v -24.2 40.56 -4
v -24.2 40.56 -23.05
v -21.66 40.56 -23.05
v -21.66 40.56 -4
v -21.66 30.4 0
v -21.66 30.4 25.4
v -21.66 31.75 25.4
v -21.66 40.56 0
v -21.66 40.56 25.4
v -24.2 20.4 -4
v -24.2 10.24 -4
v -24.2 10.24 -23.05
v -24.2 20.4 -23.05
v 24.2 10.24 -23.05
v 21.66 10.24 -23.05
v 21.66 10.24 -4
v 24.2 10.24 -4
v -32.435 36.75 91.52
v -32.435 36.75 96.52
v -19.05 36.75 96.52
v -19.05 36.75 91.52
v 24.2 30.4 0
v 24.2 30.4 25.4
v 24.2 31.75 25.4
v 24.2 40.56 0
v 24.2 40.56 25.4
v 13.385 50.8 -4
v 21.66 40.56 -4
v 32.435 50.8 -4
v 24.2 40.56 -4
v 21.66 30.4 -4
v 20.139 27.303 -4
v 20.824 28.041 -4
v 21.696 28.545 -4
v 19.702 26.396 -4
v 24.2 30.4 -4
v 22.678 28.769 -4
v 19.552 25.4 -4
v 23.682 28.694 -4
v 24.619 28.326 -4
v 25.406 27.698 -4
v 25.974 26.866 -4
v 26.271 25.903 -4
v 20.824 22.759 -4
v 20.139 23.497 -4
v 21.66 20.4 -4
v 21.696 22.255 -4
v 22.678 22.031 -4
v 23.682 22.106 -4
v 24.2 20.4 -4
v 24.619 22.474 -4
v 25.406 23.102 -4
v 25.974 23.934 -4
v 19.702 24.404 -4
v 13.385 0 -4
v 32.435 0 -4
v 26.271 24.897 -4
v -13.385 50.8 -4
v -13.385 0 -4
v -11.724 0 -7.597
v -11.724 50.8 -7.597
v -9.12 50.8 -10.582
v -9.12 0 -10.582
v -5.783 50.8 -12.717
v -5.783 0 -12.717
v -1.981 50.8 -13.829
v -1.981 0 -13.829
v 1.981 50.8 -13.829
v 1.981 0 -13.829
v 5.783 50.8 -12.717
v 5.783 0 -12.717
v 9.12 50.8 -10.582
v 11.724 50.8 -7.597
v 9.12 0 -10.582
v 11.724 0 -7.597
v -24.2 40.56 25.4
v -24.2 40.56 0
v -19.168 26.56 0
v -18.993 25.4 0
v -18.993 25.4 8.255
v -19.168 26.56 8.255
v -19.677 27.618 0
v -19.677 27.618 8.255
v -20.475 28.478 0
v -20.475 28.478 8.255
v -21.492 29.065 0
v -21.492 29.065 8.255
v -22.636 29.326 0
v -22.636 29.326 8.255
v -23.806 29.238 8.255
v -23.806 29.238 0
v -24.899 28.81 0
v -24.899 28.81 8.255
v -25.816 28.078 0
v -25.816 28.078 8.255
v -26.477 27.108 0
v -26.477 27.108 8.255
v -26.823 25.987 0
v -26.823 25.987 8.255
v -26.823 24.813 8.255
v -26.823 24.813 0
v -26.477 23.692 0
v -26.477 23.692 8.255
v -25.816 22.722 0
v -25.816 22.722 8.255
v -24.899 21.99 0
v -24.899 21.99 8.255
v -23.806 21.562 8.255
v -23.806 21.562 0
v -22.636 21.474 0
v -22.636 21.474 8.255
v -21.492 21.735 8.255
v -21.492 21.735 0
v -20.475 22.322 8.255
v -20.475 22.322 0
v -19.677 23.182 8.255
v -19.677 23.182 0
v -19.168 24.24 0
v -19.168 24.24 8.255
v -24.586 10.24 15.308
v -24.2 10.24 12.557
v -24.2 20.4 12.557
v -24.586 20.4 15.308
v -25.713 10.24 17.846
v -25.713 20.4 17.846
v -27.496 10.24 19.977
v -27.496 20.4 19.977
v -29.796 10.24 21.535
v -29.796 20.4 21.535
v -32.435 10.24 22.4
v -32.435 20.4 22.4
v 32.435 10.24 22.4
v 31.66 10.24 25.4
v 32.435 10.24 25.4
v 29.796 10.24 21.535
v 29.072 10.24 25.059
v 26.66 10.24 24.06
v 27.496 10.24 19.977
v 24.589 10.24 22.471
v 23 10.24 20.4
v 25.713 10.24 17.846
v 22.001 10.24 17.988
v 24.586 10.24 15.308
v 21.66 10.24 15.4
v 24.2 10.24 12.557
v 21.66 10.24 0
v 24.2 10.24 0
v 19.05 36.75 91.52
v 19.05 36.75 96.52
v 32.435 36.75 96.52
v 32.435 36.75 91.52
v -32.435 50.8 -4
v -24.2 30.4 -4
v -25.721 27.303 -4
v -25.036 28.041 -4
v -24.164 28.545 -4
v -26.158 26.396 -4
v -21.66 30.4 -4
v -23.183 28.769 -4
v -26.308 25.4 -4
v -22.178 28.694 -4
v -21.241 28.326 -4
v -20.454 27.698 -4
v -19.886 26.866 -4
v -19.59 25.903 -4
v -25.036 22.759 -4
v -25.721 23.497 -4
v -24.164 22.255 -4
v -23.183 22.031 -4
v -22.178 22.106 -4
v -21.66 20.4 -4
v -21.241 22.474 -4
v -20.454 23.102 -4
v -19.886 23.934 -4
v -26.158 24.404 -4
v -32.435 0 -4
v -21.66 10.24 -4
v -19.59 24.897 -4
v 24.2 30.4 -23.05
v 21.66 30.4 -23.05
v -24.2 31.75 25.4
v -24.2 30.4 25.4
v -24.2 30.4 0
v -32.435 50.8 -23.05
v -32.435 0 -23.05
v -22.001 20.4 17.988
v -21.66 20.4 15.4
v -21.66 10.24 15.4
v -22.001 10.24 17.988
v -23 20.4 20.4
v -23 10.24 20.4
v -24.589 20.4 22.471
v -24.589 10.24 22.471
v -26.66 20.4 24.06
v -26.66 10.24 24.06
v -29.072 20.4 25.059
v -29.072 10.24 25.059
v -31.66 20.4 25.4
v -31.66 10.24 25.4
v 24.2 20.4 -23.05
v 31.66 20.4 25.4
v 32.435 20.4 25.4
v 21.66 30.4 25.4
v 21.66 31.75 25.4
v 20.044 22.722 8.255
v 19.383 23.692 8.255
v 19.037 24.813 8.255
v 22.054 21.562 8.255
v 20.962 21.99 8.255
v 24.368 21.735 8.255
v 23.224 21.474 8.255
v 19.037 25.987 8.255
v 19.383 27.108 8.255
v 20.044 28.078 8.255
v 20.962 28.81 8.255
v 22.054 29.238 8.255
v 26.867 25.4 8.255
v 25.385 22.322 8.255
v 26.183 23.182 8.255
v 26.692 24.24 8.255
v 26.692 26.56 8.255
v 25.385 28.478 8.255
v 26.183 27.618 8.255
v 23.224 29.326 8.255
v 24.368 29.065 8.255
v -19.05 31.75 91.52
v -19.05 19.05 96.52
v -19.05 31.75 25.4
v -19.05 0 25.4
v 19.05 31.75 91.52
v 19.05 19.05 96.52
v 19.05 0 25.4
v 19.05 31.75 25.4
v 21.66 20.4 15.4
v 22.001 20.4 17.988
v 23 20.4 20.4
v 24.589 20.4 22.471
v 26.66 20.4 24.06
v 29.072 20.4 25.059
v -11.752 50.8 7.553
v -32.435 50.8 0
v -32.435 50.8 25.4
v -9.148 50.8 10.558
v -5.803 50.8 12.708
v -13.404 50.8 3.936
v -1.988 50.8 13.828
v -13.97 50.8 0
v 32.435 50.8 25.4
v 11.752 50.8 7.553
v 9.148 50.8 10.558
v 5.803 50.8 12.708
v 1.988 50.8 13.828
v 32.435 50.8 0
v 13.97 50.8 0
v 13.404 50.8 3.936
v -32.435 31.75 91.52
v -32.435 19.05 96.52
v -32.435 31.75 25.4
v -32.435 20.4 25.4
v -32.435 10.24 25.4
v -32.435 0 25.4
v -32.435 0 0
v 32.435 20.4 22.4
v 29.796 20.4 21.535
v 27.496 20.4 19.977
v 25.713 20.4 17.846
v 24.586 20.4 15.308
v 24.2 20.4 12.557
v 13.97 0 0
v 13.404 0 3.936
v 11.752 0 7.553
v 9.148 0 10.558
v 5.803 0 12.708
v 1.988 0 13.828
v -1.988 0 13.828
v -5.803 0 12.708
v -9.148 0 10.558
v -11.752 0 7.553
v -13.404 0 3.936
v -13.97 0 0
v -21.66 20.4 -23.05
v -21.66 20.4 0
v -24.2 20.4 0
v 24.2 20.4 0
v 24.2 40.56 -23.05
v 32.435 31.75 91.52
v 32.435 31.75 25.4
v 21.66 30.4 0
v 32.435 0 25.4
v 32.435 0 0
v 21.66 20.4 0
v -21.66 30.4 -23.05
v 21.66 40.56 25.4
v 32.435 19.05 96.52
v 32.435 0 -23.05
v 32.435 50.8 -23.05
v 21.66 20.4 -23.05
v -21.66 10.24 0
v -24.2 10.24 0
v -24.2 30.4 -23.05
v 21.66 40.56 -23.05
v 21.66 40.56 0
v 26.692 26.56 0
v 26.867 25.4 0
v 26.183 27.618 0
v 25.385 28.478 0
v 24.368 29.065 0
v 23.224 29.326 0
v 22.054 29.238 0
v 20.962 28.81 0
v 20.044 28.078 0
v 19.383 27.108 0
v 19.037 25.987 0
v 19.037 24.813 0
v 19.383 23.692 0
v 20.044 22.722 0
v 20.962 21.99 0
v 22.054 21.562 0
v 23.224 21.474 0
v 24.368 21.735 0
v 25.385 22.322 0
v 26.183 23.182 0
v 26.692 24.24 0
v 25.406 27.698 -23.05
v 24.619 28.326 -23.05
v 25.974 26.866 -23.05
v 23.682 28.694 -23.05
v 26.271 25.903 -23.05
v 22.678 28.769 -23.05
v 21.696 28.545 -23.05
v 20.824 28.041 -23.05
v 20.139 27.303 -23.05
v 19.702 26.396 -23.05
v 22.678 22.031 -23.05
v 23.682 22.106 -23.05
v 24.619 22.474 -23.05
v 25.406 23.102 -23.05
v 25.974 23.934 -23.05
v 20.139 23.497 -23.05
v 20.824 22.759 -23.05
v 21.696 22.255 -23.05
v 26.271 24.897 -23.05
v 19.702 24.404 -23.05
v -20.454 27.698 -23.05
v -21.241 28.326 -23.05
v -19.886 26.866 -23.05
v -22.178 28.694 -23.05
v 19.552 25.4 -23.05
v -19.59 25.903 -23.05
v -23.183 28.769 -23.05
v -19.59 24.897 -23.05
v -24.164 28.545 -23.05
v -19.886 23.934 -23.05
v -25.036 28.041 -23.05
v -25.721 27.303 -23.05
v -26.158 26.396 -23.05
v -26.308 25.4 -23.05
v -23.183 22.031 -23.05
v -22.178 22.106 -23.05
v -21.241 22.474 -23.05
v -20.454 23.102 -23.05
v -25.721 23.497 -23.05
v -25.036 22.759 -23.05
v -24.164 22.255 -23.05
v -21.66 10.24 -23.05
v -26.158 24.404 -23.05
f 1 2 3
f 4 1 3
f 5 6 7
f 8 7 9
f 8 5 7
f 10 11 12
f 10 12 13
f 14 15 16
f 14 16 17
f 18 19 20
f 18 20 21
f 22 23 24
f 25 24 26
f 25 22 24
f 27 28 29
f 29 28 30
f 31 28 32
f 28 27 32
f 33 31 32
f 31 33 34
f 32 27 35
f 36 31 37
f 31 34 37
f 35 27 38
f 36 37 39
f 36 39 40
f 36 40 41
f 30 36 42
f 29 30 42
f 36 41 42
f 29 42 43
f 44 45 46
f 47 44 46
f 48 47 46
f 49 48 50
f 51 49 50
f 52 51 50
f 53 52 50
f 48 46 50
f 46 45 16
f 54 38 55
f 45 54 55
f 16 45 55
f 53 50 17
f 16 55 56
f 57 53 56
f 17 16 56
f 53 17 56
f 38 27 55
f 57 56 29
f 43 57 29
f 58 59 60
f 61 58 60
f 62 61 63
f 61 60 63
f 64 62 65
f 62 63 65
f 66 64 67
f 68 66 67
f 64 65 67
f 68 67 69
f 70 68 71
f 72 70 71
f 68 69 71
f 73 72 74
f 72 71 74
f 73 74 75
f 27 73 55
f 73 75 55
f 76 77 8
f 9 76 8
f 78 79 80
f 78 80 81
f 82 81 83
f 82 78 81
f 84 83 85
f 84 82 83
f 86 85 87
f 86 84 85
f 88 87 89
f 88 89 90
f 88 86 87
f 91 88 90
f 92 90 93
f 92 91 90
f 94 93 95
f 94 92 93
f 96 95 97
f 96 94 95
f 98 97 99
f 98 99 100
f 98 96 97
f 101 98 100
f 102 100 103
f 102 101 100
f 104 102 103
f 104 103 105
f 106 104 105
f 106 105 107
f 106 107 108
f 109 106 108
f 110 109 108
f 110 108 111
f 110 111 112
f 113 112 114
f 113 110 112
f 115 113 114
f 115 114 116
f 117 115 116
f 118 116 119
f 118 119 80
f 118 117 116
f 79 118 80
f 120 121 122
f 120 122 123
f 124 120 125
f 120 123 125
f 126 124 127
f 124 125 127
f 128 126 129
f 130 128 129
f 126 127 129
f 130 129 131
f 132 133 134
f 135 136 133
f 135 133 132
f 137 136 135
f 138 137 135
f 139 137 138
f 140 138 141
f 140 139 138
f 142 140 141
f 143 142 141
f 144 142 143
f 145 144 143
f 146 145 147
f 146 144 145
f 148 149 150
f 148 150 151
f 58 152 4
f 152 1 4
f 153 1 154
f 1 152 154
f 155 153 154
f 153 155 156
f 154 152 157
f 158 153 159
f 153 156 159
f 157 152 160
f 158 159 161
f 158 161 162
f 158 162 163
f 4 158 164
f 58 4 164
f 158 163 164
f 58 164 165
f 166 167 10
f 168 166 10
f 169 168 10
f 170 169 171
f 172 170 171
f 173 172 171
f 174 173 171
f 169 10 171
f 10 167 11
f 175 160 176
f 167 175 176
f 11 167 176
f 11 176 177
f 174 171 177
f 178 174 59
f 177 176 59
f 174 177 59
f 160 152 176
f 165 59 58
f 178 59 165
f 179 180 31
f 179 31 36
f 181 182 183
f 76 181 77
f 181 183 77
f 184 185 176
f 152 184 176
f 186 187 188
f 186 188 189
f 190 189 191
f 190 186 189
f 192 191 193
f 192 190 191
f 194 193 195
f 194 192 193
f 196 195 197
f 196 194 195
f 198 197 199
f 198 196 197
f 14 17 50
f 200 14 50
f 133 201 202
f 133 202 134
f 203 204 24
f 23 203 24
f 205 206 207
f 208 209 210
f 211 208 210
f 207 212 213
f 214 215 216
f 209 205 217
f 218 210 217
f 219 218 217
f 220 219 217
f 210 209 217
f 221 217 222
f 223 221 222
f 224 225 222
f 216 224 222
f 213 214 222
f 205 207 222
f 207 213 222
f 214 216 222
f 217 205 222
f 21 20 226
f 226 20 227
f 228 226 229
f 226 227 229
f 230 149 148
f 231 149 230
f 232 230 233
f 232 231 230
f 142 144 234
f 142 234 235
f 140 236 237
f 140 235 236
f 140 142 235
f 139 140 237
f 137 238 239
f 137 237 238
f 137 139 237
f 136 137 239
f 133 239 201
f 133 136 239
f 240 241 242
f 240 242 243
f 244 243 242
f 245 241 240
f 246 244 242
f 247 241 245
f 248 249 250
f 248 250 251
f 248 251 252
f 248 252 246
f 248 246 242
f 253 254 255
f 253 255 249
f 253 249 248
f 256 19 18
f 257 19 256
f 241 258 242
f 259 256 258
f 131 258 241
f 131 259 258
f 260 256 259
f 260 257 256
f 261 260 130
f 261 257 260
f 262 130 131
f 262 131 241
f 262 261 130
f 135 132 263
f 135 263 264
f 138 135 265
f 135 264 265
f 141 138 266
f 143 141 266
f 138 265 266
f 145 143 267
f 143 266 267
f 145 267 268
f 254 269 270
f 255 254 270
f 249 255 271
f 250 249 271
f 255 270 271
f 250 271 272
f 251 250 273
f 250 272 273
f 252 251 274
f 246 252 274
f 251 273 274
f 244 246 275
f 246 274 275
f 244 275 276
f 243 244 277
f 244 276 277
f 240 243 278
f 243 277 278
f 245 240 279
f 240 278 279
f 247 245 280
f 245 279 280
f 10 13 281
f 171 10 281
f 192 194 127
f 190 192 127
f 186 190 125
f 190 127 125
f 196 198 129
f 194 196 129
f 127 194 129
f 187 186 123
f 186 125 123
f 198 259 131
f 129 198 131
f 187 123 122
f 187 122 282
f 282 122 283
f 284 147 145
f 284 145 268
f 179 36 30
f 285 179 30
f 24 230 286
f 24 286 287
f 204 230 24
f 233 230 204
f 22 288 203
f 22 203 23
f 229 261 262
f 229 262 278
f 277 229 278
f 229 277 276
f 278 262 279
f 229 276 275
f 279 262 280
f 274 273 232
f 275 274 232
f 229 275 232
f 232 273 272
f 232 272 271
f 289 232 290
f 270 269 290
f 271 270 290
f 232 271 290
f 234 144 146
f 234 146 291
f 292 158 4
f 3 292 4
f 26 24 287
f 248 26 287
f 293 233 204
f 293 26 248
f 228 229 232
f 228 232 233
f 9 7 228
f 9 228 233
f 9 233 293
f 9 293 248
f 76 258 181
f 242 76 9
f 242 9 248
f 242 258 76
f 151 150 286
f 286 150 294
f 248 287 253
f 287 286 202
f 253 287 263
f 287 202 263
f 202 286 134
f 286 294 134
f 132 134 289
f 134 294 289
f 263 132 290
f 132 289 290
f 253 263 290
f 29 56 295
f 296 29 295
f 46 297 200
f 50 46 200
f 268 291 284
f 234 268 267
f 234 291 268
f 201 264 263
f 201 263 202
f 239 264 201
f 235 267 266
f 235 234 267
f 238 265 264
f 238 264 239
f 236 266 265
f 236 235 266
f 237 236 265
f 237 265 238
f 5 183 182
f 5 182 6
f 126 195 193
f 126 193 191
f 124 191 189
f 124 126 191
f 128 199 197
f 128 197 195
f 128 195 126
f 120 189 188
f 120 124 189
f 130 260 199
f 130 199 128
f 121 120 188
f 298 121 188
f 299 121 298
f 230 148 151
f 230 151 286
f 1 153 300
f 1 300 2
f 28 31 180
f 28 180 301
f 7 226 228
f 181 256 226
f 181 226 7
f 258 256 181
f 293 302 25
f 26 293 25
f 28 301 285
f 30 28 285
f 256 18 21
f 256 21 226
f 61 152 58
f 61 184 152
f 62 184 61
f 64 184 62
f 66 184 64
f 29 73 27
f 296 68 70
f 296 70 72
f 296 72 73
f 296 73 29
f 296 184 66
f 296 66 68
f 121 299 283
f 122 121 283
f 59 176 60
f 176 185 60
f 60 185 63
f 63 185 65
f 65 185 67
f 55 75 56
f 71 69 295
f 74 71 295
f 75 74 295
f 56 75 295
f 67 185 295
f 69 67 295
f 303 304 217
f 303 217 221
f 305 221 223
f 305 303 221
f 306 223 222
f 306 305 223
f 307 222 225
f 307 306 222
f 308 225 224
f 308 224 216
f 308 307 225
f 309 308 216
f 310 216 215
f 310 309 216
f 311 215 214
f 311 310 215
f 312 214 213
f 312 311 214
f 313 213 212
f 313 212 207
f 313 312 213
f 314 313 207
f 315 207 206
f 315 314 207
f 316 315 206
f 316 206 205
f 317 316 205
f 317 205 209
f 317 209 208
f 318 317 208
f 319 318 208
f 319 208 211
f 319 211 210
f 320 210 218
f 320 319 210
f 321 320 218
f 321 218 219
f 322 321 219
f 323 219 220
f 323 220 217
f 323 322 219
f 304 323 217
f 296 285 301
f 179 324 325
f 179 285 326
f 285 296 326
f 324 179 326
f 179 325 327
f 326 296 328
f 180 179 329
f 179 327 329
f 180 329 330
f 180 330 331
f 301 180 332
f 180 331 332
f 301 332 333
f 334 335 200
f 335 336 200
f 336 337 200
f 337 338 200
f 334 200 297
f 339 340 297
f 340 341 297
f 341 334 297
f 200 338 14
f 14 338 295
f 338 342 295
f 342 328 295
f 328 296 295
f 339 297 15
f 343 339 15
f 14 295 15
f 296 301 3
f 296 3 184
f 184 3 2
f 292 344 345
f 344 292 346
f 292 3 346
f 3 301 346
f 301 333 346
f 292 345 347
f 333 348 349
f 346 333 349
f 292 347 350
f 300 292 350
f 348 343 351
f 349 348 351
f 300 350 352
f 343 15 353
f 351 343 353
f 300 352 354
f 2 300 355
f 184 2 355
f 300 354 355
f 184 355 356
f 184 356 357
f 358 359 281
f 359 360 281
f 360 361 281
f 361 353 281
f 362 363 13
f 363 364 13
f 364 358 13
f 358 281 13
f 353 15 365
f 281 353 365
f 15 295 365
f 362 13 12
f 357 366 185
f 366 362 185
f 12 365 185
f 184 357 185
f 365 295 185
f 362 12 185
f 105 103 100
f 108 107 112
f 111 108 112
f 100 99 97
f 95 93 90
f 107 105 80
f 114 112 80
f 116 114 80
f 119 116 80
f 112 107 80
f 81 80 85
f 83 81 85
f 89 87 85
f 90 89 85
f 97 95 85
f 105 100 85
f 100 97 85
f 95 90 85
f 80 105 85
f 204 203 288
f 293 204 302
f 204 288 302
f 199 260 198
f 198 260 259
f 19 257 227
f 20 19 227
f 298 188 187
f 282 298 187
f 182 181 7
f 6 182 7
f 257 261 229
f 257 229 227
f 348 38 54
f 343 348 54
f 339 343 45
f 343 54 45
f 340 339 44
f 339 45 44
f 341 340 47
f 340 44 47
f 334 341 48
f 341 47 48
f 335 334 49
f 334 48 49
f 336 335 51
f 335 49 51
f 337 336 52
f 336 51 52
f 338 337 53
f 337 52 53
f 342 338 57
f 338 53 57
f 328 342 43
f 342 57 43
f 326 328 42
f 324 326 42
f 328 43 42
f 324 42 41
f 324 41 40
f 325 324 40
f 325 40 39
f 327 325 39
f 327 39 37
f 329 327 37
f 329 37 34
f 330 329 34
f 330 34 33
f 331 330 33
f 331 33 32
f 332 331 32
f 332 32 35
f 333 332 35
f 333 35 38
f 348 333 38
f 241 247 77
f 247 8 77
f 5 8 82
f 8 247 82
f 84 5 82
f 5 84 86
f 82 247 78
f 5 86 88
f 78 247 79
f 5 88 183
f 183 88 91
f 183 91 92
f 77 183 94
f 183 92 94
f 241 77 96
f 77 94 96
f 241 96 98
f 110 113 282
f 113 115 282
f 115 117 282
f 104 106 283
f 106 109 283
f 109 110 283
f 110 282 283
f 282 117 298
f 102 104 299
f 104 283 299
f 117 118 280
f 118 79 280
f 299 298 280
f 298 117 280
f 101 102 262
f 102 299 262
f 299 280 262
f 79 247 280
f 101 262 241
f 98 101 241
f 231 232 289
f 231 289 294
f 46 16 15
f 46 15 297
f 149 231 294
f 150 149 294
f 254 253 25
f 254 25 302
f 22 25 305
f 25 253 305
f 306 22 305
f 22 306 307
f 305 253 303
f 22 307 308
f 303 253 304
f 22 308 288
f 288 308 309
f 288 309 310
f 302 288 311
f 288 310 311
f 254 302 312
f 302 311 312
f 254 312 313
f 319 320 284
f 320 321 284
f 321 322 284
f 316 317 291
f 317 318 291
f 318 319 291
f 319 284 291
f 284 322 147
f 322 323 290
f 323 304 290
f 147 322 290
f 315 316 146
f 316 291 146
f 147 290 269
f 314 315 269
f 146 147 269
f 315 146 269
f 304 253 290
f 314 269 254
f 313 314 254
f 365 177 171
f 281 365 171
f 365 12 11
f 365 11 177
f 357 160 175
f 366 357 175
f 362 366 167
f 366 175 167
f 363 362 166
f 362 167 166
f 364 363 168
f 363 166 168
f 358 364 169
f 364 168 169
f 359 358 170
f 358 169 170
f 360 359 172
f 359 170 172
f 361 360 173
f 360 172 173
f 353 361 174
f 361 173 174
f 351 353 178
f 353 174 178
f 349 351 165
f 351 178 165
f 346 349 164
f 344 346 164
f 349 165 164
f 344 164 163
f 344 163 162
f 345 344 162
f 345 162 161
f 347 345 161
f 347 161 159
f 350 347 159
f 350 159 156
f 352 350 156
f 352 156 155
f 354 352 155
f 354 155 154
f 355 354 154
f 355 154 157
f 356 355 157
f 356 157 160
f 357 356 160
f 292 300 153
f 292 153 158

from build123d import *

# Parameters (mm, degrees)
BOSS_EXTRUDE1_DEPTH = 50.8
BOSS_EXTRUDE3_DEPTH = 50.8
SKETCH1_4_W         = 13.385099925
SKETCH1_4_H         = 71.12
BOSS_EXTRUDE2_DEPTH = 50.8
CUT_EXTRUDE1_START  = -32.435099925
CUT_EXTRUDE1_DEPTH  = 64.87019985
SKETCH3_R           = 3.937
SKETCH3_R_2         = 3.3782
CUT_EXTRUDE2_DEPTH  = 8.255
SKETCH3_2_W         = 2.54
SKETCH3_2_H         = 10.16
CUT_EXTRUDE3_DEPTH  = 25.4
CUT_EXTRUDE6_START  = -32.4351
SKETCH2_6_W         = 3
SKETCH2_6_H         = 10.16
CUT_EXTRUDE6_DEPTH  = 8.235
CUT_EXTRUDE7_START  = 21.6601
CUT_EXTRUDE7_DEPTH  = 10.775
FILLET2_R           = 10
SKETCH3_5_R         = 3.3782
SKETCH3_5_W         = 2.54
SKETCH3_5_H         = 10.16
CUT_EXTRUDE8_DEPTH  = 28.255


with BuildPart() as part:
    # Sketch1 → Boss-Extrude1 (new body)
    with BuildSketch(Plane(origin=(0, 0, 0), x_dir=(1, 0, 0), z_dir=(0, 1, 0))):
        with BuildLine():
            ThreePointArc((13.97, 0), (0, -13.97), (-13.97, 0))
            Line((-13.97, 0), (-32.435099925, 0))
            Line((-32.435099925, 0), (-32.435099925, -25.4))
            Line((-32.435099925, -25.4), (-19.05, -25.4))
            Line((-19.05, -25.4), (19.05, -25.4))
            Line((19.05, -25.4), (32.435099925, -25.4))
            Line((32.435099925, -25.4), (32.435099925, 0))
            Line((32.435099925, 0), (13.97, 0))
        make_face()
    extrude(amount=BOSS_EXTRUDE1_DEPTH)

    # Sketch1<4> → Boss-Extrude2 (add)
    with BuildSketch(Plane(origin=(0, 0, 0), x_dir=(1, 0, 0), z_dir=(0, 1, 0))):
        with Locations((-25.742549963, -60.96)):
            Rectangle(SKETCH1_4_W, SKETCH1_4_H)
        with Locations((25.742549963, -60.96)):
            Rectangle(SKETCH1_4_W, SKETCH1_4_H)
    extrude(amount=BOSS_EXTRUDE2_DEPTH)

    # Cut-Extrude1: read off the stored shape, not the designer's step
    # Cut-Extrude1 outline → Cut-Extrude1 (cut)
    with BuildSketch(Plane(origin=(0, 0, 0), x_dir=(0, 0, -1), z_dir=(1, 0, 0)).offset(CUT_EXTRUDE1_START)):
        Polygon((-96.52, 0), (-25.4, 0), (-96.52, 19.05), align=None)
        Polygon((-91.52, 31.75), (-25.4, 31.75), (-25.4, 50.8), (-96.52, 50.8), (-96.52, 36.75), (-91.52, 36.75), align=None)
    extrude(amount=CUT_EXTRUDE1_DEPTH, mode=Mode.SUBTRACT)

    # Sketch3 → Cut-Extrude2 (cut)
    # profile 1 of 4: a face of its own
    with BuildSketch(Plane.XY):
        with Locations((-22.930099925, 25.4)):
            Circle(SKETCH3_R)
        with Locations((-22.930099925, 25.4)):
            Circle(SKETCH3_R_2, mode=Mode.SUBTRACT)
    # profile 2 of 4: a face of its own
    with BuildSketch(Plane.XY):
        with Locations((-22.930099925, 25.4)):
            Circle(SKETCH3_R_2)
    # profile 3 of 4: a face of its own
    with BuildSketch(Plane.XY):
        with Locations((22.930099925, 25.4)):
            Circle(SKETCH3_R)
        with Locations((22.930099925, 25.4)):
            Circle(SKETCH3_R_2, mode=Mode.SUBTRACT)
    # profile 4 of 4: a face of its own
    with BuildSketch(Plane.XY):
        with Locations((22.930099925, 25.4)):
            Circle(SKETCH3_R_2)
    extrude(amount=CUT_EXTRUDE2_DEPTH, mode=Mode.SUBTRACT)

    # Sketch3<2> → Cut-Extrude3 (cut)
    with BuildSketch(Plane.XY):
        with Locations((22.930099925, 35.48)):
            Rectangle(SKETCH3_2_W, SKETCH3_2_H)
        with Locations((-22.930099925, 35.48)):
            Rectangle(SKETCH3_2_W, SKETCH3_2_H)
        with Locations((22.930099925, 15.32)):
            Rectangle(SKETCH3_2_W, SKETCH3_2_H)
        with Locations((-22.930099925, 15.32)):
            Rectangle(SKETCH3_2_W, SKETCH3_2_H)
    extrude(amount=CUT_EXTRUDE3_DEPTH, mode=Mode.SUBTRACT)

    # Sketch2<6> → Cut-Extrude6 (cut)
    with BuildSketch(Plane(origin=(0, 0, 0), x_dir=(0, 0, -1), z_dir=(1, 0, 0)).offset(CUT_EXTRUDE6_START)):
        Polygon((-96.52, 19.05), (-96.52, 0), (-25.4, 0), align=None)
        with Locations((-23.9, 15.32)):
            Rectangle(SKETCH2_6_W, SKETCH2_6_H)
    extrude(amount=CUT_EXTRUDE6_DEPTH, mode=Mode.SUBTRACT)

    # Sketch2<7> → Cut-Extrude7 (cut)
    with BuildSketch(Plane(origin=(0, 0, 0), x_dir=(0, 0, -1), z_dir=(1, 0, 0)).offset(CUT_EXTRUDE7_START)):
        Polygon((-22.4, 20.4), (-25.4, 20.4), (-25.4, 19.05), (-25.4, 10.24), (-22.4, 10.24), align=None)
    extrude(amount=CUT_EXTRUDE7_DEPTH, mode=Mode.SUBTRACT)

    # Fillet2
    # the kernel refuses this fillet: 10 mm, written as the material it takes off along each edge
    with BuildSketch(Plane(origin=(24.200099925, 20.4, 22.4), x_dir=(0, 0, -1), z_dir=(0, -1, 0))) as fillet2_piece_1:
        with BuildLine():
            CenterArc((9.843006414, 10), FILLET2_R, 190.165960228, 79.834039772)
            Line((0, 8.235000075), (0, 0))
            Line((0, 0), (9.843006414, 0))
        make_face()
    extrude(amount=10.16, mode=Mode.SUBTRACT)
    # the kernel refuses this fillet: 10 mm, written as the material it takes off along each edge
    with BuildSketch(Plane(origin=(-24.2001, 20.4, 22.4), x_dir=(7.62810550624482e-09, 0, -1.0), z_dir=(0, -1, 0))) as fillet2_2_piece_1:
        with BuildLine():
            CenterArc((9.843006338, -10), FILLET2_R, 89.999999563, 79.834039772)
            Line((-6.3e-08, -8.235), (0, 0))
            Line((0, 0), (9.843006414, 0))
        make_face()
    extrude(amount=10.16, mode=Mode.SUBTRACT)
    # the kernel refuses this fillet: 10 mm, written as the material it adds along each edge
    with BuildSketch(Plane(origin=(21.660099925, 10.24, 25.4), x_dir=(1, 0, 0), z_dir=(0, 1, 0))) as fillet2_3_piece_1_section:
        with BuildLine():
            CenterArc((FILLET2_R, FILLET2_R), FILLET2_R, 180, 90)
            Line((0, FILLET2_R), (0, 0))
            Line((0, 0), (FILLET2_R, 0))
        make_face()
    fillet2_3_piece_1 = extrude(amount=35.16, mode=Mode.PRIVATE)
    fillet2_3_piece_1 = split(fillet2_3_piece_1, bisect_by=Plane(origin=(21.660099925, 30.4, 25.4), z_dir=(0, -1, 0)), keep=Keep.TOP, mode=Mode.PRIVATE)
    add(fillet2_3_piece_1)
    # the kernel refuses this fillet: 10 mm, written as the material it adds along each edge
    with BuildSketch(Plane(origin=(-21.660099925, 45.4, 25.4), x_dir=(0, 0, -1), z_dir=(0, -1, 0))) as fillet2_4_piece_1_section:
        with BuildLine():
            CenterArc((FILLET2_R, -FILLET2_R), FILLET2_R, 90, 90)
            Line((0, -FILLET2_R), (0, 0))
            Line((0, 0), (FILLET2_R, 0))
        make_face()
    fillet2_4_piece_1 = extrude(amount=60.16, mode=Mode.PRIVATE)
    fillet2_4_piece_1 = split(fillet2_4_piece_1, bisect_by=Plane(origin=(-21.660099925, 30.4, 25.4), z_dir=(0, -1, 0)), keep=Keep.TOP, mode=Mode.PRIVATE)
    fillet2_4_piece_1 = split(fillet2_4_piece_1, bisect_by=Plane(origin=(-21.660099925, 0, 25.4), z_dir=(0, 1, 0)), keep=Keep.TOP, mode=Mode.PRIVATE)
    add(fillet2_4_piece_1)


with BuildPart() as body_2:
    # Sketch1<5> → Boss-Extrude3 (new body)
    with BuildSketch(Plane(origin=(0, 0, 0), x_dir=(1, 0, 0), z_dir=(0, 1, 0))):
        with BuildLine():
            Line((-32.435099925, 4), (-13.385099925, 4))
            ThreePointArc((-13.385099925, 4), (0, 13.97), (13.385099925, 4))
            Line((13.385099925, 4), (32.435099925, 4))
            Line((32.435099925, 4), (32.435099925, 23.05))
            Line((32.435099925, 23.05), (-32.435099925, 23.05))
            Line((-32.435099925, 23.05), (-32.435099925, 4))
        make_face()
    extrude(amount=BOSS_EXTRUDE3_DEPTH)

    # Sketch3<5> → Cut-Extrude8 (cut)
    with BuildSketch(Plane.XY):
        with Locations(Location((22.930099925, 25.4, 0), (0, 0, 180))):
            Circle(SKETCH3_5_R)
        with Locations((22.930099925, 35.48)):
            Rectangle(SKETCH3_5_W, SKETCH3_5_H)
        with Locations((22.930099925, 15.32)):
            Rectangle(SKETCH3_5_W, SKETCH3_5_H)
        with Locations((-22.930099925, 35.48)):
            Rectangle(SKETCH3_5_W, SKETCH3_5_H)
        with Locations(Location((-22.930099925, 25.4, 0), (0, 0, 180))):
            Circle(SKETCH3_5_R)
        with Locations((-22.930099925, 15.32)):
            Rectangle(SKETCH3_5_W, SKETCH3_5_H)
    extrude(amount=-CUT_EXTRUDE8_DEPTH, mode=Mode.SUBTRACT)


solid = Compound([part.part, body_2.part])
